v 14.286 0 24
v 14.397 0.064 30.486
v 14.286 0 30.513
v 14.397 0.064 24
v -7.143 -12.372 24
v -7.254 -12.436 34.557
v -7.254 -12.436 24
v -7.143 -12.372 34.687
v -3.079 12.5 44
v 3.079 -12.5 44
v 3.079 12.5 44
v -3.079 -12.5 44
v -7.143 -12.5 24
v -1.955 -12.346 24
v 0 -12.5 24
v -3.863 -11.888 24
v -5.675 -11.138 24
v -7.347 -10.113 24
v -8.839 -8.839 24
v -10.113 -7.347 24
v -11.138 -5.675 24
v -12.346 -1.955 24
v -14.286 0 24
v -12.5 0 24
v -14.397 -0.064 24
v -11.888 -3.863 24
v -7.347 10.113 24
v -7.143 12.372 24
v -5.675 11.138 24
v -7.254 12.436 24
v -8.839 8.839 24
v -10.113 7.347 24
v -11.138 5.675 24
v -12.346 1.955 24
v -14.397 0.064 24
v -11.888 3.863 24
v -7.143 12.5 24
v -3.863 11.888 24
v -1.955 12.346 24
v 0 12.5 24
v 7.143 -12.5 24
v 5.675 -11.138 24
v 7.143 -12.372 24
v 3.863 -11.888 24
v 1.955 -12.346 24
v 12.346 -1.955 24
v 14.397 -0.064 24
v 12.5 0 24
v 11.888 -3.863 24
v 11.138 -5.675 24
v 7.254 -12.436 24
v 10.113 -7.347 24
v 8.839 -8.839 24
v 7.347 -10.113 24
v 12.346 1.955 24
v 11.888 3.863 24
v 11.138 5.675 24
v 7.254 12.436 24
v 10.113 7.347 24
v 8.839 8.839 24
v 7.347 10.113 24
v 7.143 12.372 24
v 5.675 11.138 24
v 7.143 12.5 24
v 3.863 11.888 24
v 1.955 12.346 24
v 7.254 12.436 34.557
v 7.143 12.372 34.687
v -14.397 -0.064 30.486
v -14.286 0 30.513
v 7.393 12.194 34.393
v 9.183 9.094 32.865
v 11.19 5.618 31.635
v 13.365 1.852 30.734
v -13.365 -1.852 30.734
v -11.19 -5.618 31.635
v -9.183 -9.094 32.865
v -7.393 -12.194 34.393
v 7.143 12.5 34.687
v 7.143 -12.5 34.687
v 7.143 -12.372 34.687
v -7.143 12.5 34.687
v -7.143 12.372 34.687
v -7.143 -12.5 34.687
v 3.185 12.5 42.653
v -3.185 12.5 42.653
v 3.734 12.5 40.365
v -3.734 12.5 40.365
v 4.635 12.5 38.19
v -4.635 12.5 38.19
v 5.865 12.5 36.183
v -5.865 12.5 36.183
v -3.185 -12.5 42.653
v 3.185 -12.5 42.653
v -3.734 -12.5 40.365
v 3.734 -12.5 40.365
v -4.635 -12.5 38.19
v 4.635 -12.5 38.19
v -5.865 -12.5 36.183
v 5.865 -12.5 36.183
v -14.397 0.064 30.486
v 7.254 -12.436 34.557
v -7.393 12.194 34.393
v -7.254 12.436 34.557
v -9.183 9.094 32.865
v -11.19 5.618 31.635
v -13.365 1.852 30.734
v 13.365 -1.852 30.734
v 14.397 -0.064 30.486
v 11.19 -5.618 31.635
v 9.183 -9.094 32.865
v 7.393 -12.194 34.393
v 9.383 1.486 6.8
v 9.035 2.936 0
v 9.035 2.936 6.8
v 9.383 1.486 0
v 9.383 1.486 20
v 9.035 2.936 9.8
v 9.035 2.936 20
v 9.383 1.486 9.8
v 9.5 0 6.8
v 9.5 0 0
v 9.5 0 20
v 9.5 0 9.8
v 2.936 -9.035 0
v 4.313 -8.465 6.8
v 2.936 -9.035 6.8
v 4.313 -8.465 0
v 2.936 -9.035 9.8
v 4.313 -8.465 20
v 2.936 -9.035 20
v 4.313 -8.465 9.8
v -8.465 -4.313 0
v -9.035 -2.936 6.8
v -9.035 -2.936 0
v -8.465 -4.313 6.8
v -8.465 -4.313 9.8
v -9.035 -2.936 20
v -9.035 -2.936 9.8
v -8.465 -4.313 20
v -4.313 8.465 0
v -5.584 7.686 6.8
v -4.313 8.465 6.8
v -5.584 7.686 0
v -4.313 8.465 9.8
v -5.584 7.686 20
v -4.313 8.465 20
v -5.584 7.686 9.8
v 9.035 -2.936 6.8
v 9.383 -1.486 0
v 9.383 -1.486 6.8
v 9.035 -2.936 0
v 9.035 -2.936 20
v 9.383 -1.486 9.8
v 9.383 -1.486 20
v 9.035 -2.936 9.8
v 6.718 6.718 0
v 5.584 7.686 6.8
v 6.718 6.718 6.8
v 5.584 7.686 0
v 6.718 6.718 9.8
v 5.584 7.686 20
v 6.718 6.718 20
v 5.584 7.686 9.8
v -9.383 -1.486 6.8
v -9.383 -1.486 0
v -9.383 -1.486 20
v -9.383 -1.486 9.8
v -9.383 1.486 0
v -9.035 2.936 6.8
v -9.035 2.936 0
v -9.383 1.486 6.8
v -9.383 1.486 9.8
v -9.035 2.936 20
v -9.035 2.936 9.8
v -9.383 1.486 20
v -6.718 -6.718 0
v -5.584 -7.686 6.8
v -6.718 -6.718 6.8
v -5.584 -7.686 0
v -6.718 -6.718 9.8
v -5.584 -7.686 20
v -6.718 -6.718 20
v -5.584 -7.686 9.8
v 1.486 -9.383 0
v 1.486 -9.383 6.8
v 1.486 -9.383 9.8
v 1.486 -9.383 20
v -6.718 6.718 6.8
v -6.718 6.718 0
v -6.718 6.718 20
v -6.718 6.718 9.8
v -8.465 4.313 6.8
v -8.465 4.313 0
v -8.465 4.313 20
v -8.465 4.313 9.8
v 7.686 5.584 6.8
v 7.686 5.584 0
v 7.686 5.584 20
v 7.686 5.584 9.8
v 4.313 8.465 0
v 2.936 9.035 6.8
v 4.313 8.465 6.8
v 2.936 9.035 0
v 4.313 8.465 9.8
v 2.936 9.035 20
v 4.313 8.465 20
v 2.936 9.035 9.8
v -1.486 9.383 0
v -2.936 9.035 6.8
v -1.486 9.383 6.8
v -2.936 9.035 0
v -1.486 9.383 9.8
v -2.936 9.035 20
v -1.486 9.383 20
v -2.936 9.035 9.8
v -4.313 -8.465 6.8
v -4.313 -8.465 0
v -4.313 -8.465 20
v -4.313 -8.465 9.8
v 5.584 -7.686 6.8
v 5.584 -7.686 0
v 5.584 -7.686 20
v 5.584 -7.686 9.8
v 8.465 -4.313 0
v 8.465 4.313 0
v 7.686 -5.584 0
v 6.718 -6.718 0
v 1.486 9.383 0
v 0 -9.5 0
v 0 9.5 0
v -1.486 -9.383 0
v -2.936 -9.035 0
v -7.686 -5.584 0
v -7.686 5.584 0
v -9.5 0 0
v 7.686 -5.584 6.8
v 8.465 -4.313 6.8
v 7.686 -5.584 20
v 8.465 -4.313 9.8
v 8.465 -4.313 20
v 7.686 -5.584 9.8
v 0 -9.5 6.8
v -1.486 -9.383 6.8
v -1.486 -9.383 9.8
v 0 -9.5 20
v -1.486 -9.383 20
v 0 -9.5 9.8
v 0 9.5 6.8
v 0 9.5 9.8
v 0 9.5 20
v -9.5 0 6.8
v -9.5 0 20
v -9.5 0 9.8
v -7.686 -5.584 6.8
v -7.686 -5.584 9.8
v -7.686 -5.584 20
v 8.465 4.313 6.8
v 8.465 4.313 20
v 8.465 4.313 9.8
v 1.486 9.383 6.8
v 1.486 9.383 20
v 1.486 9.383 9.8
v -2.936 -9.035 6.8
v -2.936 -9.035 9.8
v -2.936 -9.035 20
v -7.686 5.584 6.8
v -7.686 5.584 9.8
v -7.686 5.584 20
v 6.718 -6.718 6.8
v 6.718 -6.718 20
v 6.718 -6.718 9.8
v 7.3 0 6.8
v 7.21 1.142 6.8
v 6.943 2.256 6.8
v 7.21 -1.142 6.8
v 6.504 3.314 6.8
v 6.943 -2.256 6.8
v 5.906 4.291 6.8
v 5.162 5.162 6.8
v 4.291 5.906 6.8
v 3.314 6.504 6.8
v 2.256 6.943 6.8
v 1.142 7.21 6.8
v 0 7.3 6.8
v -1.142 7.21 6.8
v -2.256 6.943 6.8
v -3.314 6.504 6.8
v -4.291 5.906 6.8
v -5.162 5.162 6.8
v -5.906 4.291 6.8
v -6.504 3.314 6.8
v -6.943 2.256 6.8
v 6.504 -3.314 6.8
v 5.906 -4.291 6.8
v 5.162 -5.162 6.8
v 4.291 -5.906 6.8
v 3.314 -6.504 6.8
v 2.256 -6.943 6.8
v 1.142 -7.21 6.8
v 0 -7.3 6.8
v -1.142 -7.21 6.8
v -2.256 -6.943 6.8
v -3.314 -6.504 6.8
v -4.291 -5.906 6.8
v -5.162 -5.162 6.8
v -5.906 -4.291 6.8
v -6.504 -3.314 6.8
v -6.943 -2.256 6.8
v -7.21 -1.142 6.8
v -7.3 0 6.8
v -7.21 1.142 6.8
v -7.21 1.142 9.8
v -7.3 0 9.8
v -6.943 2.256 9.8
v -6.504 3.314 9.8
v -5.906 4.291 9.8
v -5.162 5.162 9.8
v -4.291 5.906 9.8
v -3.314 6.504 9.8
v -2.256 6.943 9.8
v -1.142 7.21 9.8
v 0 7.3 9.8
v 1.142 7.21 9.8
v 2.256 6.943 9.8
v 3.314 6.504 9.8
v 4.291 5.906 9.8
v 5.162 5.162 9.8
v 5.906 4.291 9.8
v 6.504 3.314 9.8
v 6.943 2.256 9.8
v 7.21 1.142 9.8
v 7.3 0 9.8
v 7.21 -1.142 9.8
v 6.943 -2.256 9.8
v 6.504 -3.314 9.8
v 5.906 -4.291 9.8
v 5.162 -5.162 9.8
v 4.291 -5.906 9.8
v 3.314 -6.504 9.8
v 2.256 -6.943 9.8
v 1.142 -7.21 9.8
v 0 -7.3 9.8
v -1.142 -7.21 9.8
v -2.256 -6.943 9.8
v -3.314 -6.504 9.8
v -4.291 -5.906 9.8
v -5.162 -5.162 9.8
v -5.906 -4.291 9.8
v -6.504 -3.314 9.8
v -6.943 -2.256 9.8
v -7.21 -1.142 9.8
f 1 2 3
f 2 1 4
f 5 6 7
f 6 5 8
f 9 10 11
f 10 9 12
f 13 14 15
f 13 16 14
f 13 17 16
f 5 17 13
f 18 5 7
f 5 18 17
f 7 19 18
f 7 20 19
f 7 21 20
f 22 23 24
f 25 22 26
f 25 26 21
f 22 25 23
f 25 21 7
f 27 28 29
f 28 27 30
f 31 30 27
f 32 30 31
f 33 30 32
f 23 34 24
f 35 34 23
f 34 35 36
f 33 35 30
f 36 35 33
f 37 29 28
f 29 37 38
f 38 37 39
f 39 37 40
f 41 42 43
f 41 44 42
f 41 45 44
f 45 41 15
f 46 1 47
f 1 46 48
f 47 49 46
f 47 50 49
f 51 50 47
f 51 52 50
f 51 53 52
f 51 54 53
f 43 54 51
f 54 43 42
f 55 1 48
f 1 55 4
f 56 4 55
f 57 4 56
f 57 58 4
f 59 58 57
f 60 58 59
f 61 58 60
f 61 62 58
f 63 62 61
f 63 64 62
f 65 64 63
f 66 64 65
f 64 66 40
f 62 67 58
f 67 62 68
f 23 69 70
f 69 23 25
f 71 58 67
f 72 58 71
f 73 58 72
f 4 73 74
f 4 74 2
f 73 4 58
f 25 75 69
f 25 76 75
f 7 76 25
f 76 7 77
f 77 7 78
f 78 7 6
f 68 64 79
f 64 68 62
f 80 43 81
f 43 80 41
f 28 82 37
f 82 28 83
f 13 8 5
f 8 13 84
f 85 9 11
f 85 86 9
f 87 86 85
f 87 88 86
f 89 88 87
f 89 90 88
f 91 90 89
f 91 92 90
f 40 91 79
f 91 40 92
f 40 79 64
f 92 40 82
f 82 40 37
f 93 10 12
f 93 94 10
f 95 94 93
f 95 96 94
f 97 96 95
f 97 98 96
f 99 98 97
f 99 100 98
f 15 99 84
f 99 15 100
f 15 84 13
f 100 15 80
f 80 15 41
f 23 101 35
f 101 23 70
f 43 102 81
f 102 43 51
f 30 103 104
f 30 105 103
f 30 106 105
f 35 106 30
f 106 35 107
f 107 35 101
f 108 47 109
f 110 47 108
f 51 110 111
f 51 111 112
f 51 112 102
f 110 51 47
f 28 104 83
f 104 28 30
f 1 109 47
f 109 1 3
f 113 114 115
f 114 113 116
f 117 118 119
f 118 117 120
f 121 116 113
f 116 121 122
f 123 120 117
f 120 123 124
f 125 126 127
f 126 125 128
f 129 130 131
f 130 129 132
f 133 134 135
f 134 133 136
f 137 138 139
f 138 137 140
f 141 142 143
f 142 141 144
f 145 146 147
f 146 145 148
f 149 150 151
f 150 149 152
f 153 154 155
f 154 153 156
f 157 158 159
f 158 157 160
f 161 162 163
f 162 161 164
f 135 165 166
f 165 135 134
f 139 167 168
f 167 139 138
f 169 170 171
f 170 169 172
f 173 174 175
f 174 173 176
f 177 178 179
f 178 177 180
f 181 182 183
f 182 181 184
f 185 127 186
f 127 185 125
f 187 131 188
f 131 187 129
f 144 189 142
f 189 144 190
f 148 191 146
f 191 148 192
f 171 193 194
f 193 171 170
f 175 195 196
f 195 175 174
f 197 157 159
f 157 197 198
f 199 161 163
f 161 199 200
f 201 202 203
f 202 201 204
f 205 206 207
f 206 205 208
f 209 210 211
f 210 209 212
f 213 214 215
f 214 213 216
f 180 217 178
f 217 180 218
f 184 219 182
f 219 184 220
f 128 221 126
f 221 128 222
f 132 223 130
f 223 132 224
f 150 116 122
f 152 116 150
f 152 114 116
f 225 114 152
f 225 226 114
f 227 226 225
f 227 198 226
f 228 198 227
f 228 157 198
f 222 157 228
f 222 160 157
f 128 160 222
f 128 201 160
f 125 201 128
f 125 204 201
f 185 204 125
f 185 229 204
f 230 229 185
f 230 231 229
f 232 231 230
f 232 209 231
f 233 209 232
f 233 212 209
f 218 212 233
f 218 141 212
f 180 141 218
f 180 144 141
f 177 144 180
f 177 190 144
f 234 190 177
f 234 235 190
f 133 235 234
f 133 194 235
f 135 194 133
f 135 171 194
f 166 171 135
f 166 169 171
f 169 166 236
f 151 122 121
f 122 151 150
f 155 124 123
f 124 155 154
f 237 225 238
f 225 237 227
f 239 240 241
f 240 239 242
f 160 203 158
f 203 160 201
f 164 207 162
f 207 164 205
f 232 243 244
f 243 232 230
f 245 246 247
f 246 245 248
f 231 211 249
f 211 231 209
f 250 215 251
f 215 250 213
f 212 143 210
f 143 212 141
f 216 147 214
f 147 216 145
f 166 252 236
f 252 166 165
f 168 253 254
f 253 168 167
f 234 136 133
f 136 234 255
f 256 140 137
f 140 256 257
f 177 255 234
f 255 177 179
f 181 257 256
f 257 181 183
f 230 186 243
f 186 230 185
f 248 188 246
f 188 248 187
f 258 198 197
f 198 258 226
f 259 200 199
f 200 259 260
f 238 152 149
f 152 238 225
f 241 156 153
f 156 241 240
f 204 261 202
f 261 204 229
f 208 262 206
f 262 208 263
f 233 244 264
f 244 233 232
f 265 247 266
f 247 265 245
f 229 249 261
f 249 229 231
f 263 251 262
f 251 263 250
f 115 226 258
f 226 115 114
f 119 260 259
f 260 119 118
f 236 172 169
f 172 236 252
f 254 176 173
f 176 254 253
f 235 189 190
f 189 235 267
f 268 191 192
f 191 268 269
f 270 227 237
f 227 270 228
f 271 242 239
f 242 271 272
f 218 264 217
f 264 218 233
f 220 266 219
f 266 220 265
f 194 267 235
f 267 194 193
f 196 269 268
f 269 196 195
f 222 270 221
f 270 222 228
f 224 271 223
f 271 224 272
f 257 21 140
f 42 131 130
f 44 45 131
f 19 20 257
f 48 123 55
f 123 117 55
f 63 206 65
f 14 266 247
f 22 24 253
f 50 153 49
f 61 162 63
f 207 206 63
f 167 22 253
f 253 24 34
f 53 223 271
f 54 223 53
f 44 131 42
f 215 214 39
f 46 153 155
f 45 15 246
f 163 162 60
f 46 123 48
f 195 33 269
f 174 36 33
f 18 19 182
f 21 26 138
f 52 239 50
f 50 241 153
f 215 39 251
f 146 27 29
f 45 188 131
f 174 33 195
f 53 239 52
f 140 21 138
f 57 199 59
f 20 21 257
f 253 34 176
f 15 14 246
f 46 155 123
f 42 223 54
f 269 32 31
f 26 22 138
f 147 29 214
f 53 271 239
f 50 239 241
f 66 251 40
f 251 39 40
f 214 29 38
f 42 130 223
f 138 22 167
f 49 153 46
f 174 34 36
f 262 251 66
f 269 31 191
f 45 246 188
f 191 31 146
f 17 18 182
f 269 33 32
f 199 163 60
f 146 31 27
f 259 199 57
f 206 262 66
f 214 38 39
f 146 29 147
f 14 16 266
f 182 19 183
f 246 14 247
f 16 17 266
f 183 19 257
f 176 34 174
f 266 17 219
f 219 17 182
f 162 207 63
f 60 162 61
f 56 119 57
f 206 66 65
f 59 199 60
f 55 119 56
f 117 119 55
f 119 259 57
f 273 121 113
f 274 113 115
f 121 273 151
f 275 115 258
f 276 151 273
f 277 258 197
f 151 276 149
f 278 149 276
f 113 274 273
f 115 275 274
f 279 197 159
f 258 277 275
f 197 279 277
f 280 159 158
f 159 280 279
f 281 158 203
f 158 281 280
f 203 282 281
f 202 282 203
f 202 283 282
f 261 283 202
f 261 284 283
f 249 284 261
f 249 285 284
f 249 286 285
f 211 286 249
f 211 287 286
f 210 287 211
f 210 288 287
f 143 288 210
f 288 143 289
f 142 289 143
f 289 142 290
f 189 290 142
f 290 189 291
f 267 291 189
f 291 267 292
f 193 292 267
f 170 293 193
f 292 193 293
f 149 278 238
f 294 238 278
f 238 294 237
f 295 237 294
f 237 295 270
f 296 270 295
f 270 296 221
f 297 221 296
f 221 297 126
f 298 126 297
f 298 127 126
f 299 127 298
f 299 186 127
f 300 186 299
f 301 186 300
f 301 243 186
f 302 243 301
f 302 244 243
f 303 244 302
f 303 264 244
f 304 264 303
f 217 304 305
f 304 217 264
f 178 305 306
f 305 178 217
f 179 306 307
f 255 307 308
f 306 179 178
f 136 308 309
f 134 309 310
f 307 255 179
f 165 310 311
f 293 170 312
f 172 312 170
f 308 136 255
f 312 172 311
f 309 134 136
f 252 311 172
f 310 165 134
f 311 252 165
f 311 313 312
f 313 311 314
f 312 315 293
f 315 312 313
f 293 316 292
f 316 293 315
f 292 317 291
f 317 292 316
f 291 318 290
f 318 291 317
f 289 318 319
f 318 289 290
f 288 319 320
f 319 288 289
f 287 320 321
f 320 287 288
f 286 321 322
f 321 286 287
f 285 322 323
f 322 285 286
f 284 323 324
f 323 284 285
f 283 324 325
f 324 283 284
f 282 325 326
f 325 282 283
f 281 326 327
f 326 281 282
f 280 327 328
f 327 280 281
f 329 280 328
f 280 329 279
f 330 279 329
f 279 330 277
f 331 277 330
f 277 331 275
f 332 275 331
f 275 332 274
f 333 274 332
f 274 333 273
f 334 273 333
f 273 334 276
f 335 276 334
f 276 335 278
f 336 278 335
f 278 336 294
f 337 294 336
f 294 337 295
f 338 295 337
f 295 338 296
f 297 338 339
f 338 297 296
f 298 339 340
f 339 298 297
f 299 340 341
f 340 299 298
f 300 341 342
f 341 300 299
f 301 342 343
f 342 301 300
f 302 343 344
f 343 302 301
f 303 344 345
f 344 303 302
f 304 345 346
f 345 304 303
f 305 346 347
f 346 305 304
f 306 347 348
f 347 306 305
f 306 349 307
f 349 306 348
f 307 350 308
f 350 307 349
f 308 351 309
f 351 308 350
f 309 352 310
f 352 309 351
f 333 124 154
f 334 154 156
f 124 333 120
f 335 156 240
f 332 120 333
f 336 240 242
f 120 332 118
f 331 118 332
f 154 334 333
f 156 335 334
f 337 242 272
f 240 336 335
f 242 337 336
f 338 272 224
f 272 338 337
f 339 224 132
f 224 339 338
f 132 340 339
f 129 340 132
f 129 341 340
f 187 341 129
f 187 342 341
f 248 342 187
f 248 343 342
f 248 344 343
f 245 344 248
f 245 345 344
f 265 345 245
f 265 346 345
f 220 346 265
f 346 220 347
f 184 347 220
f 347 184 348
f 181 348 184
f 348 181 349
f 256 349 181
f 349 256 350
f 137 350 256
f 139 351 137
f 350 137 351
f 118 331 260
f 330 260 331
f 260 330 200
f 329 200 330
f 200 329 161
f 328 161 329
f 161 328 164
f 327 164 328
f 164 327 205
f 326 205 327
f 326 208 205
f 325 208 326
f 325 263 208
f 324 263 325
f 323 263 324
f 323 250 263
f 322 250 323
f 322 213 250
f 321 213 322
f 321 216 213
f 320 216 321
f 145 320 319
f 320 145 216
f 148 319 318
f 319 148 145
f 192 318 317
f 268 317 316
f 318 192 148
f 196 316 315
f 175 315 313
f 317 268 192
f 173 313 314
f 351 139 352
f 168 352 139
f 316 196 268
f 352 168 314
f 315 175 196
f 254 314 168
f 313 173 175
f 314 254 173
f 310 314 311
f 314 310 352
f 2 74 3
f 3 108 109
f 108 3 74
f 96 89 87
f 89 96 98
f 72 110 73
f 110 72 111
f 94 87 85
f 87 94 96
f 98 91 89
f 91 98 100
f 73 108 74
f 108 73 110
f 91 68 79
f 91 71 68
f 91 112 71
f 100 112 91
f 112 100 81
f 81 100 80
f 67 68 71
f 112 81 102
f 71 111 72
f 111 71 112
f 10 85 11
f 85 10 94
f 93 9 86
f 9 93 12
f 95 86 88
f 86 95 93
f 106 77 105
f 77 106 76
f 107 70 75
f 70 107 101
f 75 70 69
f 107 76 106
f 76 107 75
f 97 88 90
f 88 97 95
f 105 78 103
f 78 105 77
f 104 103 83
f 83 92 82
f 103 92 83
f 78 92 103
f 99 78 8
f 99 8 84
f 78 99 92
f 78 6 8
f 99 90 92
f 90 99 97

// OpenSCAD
// ////////////////////////////////////////////////////
// File: plug.scad
// Description:  Plug for hot tub jets.  Use with a Harbor 
//               Frieght P16 (20.6mm OD x 15.8mm ID x 2.4mm Thickness) O-Ring.
//               All units in MM!
// Author: Dang Vang 01/2016
// ////////////////////////////////////////////////////
$fn=40;   // Fragment setting.  No need to change
include <MCAD/shapes.scad>;

tol=0.5;  // Tolerance for o-ring groove fit

shrinkage = 0; // My 3dr machine seems to shrink parts by 1mm on XY axis, Z is fine

nut_size_mm=25;
pluglen_mm=24;
plugdia_mm=19;
handlelen_mm=20; 
handleradius_mm=15;
handlewidth_mm=3;
handlenutShoulder_mm=6;
oringID_mm=15.8;
oring_thickness_mm=2.4;
oring_offset_mm=8;

module Plug()
{
	difference(){ // cut out for handle
		union(){
			translate([0,0,pluglen_mm/2])
				cylinder(r=(plugdia_mm-shrinkage)/2, h=pluglen_mm, center=true);

			// Nut driver
			translate([0,0,pluglen_mm + (handlelen_mm/2) ])
				hexagon( nut_size_mm-shrinkage, handlelen_mm);

			//fillet
			translate([0,0,pluglen_mm-4])
				cylinder(h=4, r1=(plugdia_mm-shrinkage)/2, r2=(nut_size_mm-shrinkage)/2, center=false);
		}

		union(){
			//o-ring cutout
			translate([0,0,oring_offset_mm-oring_thickness_mm/2])
				rotate_extrude(convexity=10) translate([(oringID_mm-oring_thickness_mm/2)/2,0,0]) square([oring_thickness_mm+tol, 3],center=false);
	
			//handle cutouts
			translate([handleradius_mm+handlewidth_mm, 0, pluglen_mm + handleradius_mm + handlenutShoulder_mm])
				rotate([90,0,0]) cylinder(r=handleradius_mm, h=50, center=true);
			translate([-(handleradius_mm+handlewidth_mm), 0, pluglen_mm + handleradius_mm + handlenutShoulder_mm])
				rotate([90,0,0]) cylinder(r=handleradius_mm, h=50, center=true);
		}
	}
}


Plug();

//o-ring.  Uncomment for Visual Aide only
//translate([0,0,oring_offset_mm]) rotate_extrude(convexity=10) {translate([(oringID_mm+oring_thickness_mm/2)/2,0,0]) circle(r=oring_thickness_mm/2,center=false);}
